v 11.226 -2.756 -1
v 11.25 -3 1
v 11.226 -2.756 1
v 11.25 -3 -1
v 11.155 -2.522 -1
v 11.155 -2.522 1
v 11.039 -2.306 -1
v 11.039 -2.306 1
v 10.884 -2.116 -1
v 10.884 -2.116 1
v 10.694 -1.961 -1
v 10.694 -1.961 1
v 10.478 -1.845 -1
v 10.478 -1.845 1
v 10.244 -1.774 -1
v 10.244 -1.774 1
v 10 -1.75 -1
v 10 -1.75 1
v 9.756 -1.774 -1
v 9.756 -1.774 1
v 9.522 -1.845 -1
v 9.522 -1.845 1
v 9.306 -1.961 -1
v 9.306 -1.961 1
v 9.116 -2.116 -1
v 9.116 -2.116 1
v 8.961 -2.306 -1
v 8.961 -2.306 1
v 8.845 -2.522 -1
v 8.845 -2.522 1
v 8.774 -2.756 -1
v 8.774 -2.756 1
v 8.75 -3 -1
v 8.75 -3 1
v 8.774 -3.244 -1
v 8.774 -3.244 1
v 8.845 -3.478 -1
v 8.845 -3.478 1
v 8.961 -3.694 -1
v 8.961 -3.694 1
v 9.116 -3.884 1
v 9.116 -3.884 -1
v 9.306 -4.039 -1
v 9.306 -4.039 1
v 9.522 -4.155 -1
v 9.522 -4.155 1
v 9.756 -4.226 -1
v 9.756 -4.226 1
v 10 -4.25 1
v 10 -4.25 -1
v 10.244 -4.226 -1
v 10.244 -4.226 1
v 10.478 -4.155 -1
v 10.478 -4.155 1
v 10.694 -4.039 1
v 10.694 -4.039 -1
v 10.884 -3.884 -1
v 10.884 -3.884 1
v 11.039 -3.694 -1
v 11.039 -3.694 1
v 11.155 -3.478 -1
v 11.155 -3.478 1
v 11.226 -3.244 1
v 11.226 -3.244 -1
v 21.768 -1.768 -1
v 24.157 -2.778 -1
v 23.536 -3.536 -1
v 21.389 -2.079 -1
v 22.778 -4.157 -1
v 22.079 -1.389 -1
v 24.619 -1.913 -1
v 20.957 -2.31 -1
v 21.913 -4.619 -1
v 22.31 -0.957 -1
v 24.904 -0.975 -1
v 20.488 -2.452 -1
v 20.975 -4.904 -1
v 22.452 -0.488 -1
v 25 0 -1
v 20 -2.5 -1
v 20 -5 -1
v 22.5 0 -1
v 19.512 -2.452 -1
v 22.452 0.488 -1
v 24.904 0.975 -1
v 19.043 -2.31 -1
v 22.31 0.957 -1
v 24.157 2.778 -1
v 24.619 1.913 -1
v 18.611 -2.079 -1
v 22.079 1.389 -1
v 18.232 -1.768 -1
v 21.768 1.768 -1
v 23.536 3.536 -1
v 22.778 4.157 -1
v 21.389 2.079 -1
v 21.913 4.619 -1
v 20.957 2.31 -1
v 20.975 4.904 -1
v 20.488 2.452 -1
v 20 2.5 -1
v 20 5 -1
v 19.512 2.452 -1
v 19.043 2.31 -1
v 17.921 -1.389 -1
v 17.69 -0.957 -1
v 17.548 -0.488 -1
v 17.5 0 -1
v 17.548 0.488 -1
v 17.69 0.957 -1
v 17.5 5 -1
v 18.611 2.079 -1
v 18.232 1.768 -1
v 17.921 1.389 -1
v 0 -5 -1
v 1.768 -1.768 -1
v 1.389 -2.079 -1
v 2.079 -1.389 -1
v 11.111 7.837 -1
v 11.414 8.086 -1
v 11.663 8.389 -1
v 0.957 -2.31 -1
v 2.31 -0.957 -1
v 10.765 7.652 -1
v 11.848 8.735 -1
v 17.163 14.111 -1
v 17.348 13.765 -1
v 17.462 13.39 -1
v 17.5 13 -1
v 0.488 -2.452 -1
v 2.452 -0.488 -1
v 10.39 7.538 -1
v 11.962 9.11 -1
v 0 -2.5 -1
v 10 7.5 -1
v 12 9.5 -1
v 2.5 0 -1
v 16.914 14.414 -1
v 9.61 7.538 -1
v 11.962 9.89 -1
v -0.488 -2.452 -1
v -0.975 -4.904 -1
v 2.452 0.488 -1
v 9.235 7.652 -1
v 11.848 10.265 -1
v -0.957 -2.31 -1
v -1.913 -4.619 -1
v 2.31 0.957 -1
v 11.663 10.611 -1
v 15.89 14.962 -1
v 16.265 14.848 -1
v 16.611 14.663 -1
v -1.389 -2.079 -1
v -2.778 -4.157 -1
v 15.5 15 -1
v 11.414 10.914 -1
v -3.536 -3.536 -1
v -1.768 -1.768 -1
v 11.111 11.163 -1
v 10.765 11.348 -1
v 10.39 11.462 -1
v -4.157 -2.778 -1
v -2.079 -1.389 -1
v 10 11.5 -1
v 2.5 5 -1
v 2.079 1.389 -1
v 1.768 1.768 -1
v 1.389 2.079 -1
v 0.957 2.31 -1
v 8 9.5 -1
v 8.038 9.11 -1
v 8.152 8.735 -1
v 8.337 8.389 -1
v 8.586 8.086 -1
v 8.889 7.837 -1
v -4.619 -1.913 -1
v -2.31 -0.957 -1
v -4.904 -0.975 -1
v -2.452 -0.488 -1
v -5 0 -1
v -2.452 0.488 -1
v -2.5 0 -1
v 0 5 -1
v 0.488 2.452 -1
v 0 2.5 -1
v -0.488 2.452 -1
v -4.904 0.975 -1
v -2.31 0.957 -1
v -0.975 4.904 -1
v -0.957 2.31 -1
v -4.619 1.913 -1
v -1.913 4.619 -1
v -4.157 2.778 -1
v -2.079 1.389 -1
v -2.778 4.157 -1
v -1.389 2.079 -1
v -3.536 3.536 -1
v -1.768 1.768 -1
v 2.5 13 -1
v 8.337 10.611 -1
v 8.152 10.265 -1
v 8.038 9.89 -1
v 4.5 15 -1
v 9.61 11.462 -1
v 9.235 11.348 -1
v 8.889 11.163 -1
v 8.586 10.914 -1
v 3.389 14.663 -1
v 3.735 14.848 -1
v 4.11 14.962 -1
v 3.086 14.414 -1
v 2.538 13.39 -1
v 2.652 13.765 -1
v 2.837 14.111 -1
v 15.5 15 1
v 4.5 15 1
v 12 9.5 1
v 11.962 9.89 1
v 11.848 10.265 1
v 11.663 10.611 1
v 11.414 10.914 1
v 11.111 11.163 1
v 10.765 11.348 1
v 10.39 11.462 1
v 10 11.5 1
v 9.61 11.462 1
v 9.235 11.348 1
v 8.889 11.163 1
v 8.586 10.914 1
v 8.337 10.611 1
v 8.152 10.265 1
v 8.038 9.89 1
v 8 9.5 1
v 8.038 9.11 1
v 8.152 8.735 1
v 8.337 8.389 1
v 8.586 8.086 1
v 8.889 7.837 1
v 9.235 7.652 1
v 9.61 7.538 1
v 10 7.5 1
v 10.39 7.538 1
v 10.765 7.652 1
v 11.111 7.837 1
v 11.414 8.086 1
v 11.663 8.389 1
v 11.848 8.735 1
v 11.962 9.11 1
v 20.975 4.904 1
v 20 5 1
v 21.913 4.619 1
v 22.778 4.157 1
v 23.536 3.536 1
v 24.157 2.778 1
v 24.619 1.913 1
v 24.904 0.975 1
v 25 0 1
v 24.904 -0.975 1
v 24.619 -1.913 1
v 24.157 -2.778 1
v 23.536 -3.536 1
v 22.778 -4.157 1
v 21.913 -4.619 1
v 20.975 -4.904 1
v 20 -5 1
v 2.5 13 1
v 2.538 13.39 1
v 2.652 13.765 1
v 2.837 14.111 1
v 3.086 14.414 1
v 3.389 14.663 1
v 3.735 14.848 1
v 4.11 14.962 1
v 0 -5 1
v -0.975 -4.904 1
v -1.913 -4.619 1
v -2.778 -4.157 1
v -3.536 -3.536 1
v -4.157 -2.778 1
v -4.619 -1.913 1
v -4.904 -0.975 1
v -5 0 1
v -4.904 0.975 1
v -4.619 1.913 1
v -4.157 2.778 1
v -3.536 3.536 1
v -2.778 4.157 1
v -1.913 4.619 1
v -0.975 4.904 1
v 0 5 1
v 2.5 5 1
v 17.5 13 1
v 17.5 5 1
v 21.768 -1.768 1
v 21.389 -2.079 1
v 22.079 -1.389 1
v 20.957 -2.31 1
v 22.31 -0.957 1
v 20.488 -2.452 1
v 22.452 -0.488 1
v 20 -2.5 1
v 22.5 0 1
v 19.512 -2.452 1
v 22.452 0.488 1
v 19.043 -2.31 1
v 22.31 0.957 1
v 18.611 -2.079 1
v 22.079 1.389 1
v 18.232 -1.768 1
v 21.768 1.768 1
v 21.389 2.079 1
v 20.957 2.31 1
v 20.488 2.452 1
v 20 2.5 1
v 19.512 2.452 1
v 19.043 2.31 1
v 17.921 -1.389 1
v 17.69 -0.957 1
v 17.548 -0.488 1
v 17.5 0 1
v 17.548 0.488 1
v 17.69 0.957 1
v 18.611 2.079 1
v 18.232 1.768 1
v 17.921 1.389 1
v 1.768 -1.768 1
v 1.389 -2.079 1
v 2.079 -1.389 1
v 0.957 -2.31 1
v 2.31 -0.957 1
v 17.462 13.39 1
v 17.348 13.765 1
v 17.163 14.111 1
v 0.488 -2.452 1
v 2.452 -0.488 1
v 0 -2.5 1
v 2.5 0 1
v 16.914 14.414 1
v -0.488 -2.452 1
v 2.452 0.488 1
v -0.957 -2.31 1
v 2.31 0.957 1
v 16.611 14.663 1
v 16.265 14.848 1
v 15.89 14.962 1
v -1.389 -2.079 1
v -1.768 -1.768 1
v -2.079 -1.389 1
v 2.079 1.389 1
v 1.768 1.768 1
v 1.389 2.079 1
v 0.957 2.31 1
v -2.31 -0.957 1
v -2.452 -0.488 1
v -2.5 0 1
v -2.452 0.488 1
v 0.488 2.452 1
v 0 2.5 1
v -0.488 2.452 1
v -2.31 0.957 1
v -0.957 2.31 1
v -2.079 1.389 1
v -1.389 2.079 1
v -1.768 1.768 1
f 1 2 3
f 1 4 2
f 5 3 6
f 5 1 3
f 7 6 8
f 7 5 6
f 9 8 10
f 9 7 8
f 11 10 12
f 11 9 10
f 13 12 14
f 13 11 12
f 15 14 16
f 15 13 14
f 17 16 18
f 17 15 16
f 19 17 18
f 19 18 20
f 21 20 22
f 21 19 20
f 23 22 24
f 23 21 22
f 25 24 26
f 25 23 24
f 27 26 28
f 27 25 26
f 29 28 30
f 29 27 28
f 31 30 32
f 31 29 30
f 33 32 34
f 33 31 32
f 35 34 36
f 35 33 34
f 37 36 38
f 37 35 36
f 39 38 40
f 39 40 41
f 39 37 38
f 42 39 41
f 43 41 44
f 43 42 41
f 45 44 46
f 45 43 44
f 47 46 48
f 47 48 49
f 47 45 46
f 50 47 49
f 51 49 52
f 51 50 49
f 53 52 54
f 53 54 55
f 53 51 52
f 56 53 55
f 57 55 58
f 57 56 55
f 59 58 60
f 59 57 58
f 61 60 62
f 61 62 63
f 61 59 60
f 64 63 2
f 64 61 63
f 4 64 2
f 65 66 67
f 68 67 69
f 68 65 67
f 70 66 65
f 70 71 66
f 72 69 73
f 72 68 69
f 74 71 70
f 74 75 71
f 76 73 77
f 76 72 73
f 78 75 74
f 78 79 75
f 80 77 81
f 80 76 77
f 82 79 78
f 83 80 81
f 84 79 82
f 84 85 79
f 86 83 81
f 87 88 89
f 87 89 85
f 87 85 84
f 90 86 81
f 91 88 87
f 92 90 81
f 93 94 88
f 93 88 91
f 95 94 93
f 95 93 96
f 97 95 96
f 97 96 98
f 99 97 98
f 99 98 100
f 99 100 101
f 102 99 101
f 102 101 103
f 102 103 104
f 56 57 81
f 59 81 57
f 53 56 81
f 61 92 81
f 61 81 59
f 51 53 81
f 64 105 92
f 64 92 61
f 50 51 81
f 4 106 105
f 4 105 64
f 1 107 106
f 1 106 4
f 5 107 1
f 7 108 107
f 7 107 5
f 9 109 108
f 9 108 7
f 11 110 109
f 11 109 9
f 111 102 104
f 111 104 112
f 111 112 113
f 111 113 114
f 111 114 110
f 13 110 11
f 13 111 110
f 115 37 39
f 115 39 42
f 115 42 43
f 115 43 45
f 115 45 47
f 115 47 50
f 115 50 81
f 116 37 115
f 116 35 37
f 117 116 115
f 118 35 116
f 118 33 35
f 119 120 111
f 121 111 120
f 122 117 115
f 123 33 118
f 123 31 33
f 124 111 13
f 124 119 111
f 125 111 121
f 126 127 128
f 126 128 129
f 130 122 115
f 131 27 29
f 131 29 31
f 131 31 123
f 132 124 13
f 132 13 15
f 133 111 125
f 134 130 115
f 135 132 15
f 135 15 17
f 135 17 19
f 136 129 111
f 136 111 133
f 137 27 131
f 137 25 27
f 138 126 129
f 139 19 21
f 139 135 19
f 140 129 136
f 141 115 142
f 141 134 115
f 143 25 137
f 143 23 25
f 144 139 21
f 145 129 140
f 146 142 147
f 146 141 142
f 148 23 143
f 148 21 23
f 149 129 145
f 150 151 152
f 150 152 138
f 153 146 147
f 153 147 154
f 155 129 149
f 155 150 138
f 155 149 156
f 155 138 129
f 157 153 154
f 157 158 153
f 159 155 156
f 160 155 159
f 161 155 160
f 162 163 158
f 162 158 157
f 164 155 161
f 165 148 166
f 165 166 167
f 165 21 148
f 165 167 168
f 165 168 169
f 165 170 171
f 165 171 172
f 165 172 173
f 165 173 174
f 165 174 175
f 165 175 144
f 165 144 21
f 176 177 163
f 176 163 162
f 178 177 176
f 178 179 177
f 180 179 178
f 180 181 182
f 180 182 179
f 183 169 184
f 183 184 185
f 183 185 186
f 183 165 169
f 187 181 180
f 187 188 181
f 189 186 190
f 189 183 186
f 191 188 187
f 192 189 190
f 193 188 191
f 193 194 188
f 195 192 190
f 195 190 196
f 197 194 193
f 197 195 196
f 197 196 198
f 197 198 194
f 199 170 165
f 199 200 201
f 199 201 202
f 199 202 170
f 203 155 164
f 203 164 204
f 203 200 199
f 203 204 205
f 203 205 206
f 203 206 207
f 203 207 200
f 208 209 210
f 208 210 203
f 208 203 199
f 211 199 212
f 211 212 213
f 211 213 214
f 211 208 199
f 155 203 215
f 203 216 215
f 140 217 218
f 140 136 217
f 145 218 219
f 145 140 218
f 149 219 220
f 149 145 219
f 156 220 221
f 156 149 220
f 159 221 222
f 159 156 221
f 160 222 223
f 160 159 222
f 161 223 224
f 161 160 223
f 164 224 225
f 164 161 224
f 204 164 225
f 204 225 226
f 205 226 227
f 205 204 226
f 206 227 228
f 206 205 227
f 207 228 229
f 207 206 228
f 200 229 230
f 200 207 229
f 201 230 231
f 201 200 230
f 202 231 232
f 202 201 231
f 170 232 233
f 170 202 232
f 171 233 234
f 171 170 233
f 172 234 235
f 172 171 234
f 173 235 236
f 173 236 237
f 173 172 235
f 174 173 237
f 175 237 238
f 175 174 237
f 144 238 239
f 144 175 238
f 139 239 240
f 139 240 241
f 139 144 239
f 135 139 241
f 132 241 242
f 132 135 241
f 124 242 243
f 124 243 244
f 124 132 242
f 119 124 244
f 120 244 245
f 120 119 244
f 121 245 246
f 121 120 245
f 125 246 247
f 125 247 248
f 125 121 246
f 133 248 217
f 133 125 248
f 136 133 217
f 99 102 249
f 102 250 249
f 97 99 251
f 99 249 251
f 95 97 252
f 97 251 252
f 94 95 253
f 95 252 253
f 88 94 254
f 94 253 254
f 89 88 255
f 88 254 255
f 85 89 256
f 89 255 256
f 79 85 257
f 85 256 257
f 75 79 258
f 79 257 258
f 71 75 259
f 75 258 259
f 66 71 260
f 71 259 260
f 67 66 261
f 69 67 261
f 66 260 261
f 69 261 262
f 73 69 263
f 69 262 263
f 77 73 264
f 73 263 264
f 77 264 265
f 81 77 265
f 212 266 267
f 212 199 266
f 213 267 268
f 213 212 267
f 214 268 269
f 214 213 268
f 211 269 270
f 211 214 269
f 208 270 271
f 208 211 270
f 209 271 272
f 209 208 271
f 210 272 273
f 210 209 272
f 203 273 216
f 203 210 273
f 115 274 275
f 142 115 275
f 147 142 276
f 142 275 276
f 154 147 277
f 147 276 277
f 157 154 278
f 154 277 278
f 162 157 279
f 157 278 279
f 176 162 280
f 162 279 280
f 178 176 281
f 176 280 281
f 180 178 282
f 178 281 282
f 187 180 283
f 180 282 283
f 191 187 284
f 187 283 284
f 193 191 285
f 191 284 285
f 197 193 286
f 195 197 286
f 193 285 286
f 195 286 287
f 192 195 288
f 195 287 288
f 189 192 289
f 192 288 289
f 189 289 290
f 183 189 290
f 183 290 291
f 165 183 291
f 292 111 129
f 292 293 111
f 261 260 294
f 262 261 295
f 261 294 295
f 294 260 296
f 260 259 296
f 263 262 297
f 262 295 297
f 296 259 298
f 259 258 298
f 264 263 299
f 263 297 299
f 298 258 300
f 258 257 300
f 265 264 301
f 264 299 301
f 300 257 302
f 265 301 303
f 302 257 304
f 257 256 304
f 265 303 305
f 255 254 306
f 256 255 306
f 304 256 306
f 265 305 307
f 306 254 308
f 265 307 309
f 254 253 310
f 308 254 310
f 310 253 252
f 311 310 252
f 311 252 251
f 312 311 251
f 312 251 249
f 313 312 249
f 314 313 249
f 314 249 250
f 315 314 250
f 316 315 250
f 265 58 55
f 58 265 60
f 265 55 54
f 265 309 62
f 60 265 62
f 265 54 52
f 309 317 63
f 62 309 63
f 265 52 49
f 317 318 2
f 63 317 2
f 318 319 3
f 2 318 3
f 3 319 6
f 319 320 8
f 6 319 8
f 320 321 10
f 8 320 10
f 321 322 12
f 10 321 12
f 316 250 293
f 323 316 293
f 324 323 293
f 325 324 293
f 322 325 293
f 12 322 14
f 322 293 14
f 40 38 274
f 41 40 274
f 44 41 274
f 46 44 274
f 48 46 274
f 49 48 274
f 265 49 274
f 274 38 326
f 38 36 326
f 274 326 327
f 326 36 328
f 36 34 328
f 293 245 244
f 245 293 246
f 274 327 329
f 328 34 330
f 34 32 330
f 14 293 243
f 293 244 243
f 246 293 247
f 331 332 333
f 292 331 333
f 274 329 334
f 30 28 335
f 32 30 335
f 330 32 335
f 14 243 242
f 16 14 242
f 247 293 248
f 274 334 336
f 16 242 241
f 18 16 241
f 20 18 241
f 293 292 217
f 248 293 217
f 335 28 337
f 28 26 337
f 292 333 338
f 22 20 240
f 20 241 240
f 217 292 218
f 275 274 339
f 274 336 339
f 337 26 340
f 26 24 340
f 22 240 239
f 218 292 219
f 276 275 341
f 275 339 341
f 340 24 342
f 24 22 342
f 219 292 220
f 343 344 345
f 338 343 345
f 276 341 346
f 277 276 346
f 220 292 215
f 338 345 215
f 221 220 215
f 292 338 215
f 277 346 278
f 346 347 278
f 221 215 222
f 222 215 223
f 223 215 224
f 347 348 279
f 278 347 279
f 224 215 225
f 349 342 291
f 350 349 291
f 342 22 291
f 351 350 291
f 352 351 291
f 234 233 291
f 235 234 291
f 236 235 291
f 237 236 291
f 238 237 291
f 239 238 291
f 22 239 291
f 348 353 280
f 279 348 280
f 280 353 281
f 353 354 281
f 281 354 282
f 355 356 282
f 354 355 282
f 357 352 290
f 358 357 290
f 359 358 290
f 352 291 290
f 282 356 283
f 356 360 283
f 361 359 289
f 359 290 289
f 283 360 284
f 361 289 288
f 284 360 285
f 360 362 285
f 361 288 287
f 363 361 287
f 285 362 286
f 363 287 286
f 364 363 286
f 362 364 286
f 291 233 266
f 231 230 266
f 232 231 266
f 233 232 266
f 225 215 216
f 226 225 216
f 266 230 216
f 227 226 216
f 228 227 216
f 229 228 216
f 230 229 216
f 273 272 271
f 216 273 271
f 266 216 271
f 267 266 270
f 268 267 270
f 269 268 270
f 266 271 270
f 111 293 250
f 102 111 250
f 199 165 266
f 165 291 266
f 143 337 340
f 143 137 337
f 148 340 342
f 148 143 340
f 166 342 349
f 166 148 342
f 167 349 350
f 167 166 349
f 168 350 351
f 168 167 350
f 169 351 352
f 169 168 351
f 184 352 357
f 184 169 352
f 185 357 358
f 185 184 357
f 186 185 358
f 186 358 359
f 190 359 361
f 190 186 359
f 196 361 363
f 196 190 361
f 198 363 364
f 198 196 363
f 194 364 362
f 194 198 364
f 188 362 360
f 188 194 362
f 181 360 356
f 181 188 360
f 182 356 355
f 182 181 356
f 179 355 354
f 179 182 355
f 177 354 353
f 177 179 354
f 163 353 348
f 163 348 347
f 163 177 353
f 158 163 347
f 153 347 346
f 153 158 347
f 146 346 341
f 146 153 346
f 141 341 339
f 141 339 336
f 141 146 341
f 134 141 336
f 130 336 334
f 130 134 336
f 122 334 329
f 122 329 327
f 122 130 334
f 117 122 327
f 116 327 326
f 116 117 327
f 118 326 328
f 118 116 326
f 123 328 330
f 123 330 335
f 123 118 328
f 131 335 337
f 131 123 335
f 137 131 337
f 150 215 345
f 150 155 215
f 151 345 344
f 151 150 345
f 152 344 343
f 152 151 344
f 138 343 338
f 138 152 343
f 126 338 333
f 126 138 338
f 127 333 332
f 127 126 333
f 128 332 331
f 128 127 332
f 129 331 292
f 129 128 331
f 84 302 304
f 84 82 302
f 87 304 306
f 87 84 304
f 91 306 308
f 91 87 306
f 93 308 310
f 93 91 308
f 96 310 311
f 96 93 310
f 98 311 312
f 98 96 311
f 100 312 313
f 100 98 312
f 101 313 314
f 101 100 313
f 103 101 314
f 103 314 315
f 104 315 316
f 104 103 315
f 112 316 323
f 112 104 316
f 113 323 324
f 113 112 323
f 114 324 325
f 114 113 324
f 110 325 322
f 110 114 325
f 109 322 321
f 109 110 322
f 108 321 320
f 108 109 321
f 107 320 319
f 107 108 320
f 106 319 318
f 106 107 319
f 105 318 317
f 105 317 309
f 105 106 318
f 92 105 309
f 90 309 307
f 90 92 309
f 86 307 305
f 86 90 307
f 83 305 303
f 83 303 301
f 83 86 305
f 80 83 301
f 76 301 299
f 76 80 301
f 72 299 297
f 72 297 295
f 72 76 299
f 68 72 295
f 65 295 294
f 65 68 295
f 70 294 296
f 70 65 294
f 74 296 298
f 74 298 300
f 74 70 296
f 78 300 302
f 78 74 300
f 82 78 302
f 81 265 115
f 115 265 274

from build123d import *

# Parameters (mm, degrees)
SKETCH1_R           = 2.5
SKETCH1_R_2         = 1.25
BOSS_EXTRUDE1_DEPTH = 1
SKETCH2_W           = 15
SKETCH2_H           = 10
SKETCH2_R           = 2
BOSS_EXTRUDE2_DEPTH = 1
FILLET1_R           = 2


with BuildPart() as part:
    # Sketch1 → Boss-Extrude1 (new, symmetric)
    with BuildSketch(Plane.XY):
        with BuildLine():
            Line((0, 5), (20, 5))
            ThreePointArc((20, 5), (25, 0), (20, -5))
            Line((20, -5), (0, -5))
            ThreePointArc((0, -5), (-5, 0), (0, 5))
        make_face()
        Circle(SKETCH1_R, mode=Mode.SUBTRACT)
        with Locations((20, 0)):
            Circle(SKETCH1_R, mode=Mode.SUBTRACT)
        with Locations((10, -3)):
            Circle(SKETCH1_R_2, mode=Mode.SUBTRACT)
    extrude(amount=BOSS_EXTRUDE1_DEPTH, both=True)

    # Sketch2 → Boss-Extrude2 (add, symmetric)
    with BuildSketch(Plane.XY):
        with Locations((10, 10)):
            Rectangle(SKETCH2_W, SKETCH2_H)
        with Locations((10, 9.5)):
            Circle(SKETCH2_R, mode=Mode.SUBTRACT)
    extrude(amount=BOSS_EXTRUDE2_DEPTH, both=True)

    # Fillet1
    fillet1_edges = [part.edges().sort_by_distance(p)[0] for p in [
        (2.5, 15, 0),
        (17.5, 15, 0),
    ]]
    fillet(fillet1_edges, radius=FILLET1_R)


solid = part.part
